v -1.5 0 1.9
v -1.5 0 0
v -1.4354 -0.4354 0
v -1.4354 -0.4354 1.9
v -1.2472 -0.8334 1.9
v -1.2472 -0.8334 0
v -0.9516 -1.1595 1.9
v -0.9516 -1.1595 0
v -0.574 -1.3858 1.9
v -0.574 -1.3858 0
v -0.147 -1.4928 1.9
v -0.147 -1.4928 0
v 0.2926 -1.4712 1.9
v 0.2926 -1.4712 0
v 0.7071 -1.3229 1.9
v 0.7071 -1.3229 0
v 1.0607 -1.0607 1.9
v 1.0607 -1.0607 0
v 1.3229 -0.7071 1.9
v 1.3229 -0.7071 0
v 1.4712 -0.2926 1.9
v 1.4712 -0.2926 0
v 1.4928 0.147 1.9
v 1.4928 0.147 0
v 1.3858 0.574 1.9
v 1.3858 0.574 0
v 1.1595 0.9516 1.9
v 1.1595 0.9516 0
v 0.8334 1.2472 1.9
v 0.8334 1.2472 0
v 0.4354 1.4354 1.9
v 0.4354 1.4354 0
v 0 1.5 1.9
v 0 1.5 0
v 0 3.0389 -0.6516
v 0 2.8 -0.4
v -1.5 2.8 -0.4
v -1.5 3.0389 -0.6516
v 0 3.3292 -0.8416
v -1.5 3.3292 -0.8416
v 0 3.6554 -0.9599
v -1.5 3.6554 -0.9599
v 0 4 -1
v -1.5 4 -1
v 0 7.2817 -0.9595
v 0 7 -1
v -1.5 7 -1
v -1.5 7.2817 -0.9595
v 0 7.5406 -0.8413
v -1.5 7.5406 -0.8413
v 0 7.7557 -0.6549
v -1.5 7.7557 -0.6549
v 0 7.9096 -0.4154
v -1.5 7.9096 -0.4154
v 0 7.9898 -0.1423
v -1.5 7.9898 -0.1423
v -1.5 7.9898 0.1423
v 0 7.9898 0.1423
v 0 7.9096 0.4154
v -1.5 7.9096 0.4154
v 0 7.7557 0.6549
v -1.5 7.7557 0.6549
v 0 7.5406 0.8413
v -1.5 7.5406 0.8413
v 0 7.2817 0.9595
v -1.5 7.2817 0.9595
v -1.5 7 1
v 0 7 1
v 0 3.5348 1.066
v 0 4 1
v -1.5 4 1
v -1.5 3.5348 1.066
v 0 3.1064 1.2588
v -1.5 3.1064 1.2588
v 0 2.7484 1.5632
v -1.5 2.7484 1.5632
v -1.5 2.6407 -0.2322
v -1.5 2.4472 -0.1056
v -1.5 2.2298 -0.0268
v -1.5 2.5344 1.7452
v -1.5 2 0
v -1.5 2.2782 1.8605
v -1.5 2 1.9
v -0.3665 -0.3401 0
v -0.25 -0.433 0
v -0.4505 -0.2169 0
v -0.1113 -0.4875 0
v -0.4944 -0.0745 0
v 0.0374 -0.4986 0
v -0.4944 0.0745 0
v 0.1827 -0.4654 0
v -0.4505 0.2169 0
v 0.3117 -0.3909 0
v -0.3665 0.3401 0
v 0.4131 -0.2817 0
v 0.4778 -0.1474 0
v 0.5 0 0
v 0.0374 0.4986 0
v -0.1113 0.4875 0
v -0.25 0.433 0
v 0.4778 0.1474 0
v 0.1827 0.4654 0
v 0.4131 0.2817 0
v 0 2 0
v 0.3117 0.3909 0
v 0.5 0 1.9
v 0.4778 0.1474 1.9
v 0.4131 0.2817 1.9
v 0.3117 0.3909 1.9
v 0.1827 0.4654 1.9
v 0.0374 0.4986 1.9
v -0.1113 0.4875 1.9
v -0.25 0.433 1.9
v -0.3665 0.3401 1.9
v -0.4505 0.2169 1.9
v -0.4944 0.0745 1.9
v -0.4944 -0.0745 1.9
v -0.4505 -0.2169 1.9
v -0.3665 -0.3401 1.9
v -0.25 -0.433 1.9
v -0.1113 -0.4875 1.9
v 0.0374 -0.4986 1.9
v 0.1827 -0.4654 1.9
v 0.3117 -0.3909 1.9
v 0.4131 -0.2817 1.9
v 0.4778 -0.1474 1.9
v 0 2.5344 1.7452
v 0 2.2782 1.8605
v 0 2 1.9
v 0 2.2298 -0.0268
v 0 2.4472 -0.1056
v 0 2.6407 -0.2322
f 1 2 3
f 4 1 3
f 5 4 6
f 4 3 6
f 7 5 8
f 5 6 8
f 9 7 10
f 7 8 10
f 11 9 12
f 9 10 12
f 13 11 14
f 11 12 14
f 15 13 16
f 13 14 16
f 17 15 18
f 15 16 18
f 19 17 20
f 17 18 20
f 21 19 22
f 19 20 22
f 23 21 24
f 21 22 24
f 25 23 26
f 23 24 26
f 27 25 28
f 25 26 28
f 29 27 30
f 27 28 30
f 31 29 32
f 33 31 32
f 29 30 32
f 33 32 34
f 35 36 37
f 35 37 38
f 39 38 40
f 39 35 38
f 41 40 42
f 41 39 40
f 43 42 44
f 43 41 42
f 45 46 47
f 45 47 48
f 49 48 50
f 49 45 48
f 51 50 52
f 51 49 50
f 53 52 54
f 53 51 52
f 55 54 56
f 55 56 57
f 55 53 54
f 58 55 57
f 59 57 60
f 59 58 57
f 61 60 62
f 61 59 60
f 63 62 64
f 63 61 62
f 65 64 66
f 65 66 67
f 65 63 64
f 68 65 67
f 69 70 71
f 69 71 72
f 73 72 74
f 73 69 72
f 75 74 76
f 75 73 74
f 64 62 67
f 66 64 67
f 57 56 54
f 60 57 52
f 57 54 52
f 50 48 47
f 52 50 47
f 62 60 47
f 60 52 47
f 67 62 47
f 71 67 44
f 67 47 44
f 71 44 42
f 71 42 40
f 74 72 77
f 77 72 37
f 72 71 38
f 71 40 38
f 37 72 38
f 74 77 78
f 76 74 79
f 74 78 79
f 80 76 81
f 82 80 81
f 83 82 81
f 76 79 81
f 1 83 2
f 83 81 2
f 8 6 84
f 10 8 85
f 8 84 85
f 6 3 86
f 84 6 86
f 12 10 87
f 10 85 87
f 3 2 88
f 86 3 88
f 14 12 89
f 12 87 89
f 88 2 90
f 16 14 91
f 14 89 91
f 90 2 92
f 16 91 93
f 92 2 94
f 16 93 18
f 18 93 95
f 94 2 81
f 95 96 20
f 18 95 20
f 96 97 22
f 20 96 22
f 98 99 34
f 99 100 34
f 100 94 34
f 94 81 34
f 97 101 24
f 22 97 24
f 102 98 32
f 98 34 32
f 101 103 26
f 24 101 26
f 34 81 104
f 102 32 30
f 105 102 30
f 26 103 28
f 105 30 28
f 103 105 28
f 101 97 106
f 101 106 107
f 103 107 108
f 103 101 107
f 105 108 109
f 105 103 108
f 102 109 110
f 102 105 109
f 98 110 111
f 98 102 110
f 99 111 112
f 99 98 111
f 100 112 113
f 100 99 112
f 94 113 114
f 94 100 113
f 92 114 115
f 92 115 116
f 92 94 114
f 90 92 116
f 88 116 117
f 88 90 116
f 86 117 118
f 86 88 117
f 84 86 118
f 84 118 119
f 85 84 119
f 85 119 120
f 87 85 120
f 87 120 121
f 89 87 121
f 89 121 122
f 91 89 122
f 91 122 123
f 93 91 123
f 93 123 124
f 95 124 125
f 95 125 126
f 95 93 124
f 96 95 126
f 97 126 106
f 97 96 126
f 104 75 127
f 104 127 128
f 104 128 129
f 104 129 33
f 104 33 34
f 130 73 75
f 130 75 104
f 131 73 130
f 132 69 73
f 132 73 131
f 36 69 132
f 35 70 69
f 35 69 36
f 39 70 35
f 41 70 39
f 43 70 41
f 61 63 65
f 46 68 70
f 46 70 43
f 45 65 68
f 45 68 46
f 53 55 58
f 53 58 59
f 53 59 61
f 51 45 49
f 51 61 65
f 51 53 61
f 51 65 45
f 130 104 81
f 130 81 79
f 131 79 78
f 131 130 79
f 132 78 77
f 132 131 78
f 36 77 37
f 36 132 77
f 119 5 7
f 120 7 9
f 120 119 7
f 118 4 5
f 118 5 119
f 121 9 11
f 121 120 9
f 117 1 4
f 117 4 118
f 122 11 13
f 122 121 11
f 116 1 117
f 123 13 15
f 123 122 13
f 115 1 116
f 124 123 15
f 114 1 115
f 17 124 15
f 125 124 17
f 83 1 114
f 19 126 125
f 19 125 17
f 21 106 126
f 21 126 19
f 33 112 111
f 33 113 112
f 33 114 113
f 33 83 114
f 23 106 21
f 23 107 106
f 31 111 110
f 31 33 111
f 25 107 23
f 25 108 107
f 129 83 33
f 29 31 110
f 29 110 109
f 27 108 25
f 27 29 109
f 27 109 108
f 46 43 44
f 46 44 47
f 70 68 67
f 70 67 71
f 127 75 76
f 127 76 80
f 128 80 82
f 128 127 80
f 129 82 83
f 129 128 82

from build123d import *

# Parameters (mm, degrees)
CROQUIS1_R              = 1.5
CROQUIS1_R_2            = 0.5
SALIENTE_EXTRUIR1_DEPTH = 1.9
SALIENTE_EXTRUIR2_DEPTH = 1.5
SALIENTE_EXTRUIR3_START = -1.9
SALIENTE_EXTRUIR3_DEPTH = 1.9


with BuildPart() as part:
    # Croquis1 → Saliente-Extruir1 (new body)
    with BuildSketch(Plane.XY):
        with Locations(Location((0, 0, 0), (0, 0, 180))):
            Circle(CROQUIS1_R)
        Circle(CROQUIS1_R_2, mode=Mode.SUBTRACT)
    extrude(amount=SALIENTE_EXTRUIR1_DEPTH)

    # Croquis2 → Saliente-Extruir2 (add)
    with BuildSketch(Plane(origin=(0, 0, 0), x_dir=(0, 0, -1), z_dir=(1, 0, 0))):
        with BuildLine():
            Line((-1.9, 2), (-1.9, 1))
            Line((-1.9, 1), (0, 1))
            Line((0, 1), (0, 2))
            ThreePointArc((0, 2), (0.105572809, 2.447213595), (0.4, 2.8))
            ThreePointArc((0.4, 2.8), (0.841640786, 3.329179607), (1, 4))
            Line((1, 4), (1, 7))
            ThreePointArc((1, 7), (0, 8), (-1, 7))
            Line((-1, 7), (-1, 4))
            ThreePointArc((-1, 4), (-1.147286816, 3.313779067), (-1.563201663, 2.748440748))
            ThreePointArc((-1.563201663, 2.748440748), (-1.811921505, 2.410364677), (-1.9, 2))
        make_face()
    extrude(amount=-SALIENTE_EXTRUIR2_DEPTH)

    # Croquis3 → Saliente-Extruir3 (add)
    with BuildSketch(Plane.XY.offset(1.9).offset(SALIENTE_EXTRUIR3_START)):
        with BuildLine():
            Line((-1.5, 1), (-1.5, 0))
            ThreePointArc((-1.5, 0), (-1.401258538, 0.535233135), (-1.118033989, 1))
            Line((-1.118033989, 1), (-1.5, 1))
        make_face()
    extrude(amount=SALIENTE_EXTRUIR3_DEPTH)


solid = part.part
